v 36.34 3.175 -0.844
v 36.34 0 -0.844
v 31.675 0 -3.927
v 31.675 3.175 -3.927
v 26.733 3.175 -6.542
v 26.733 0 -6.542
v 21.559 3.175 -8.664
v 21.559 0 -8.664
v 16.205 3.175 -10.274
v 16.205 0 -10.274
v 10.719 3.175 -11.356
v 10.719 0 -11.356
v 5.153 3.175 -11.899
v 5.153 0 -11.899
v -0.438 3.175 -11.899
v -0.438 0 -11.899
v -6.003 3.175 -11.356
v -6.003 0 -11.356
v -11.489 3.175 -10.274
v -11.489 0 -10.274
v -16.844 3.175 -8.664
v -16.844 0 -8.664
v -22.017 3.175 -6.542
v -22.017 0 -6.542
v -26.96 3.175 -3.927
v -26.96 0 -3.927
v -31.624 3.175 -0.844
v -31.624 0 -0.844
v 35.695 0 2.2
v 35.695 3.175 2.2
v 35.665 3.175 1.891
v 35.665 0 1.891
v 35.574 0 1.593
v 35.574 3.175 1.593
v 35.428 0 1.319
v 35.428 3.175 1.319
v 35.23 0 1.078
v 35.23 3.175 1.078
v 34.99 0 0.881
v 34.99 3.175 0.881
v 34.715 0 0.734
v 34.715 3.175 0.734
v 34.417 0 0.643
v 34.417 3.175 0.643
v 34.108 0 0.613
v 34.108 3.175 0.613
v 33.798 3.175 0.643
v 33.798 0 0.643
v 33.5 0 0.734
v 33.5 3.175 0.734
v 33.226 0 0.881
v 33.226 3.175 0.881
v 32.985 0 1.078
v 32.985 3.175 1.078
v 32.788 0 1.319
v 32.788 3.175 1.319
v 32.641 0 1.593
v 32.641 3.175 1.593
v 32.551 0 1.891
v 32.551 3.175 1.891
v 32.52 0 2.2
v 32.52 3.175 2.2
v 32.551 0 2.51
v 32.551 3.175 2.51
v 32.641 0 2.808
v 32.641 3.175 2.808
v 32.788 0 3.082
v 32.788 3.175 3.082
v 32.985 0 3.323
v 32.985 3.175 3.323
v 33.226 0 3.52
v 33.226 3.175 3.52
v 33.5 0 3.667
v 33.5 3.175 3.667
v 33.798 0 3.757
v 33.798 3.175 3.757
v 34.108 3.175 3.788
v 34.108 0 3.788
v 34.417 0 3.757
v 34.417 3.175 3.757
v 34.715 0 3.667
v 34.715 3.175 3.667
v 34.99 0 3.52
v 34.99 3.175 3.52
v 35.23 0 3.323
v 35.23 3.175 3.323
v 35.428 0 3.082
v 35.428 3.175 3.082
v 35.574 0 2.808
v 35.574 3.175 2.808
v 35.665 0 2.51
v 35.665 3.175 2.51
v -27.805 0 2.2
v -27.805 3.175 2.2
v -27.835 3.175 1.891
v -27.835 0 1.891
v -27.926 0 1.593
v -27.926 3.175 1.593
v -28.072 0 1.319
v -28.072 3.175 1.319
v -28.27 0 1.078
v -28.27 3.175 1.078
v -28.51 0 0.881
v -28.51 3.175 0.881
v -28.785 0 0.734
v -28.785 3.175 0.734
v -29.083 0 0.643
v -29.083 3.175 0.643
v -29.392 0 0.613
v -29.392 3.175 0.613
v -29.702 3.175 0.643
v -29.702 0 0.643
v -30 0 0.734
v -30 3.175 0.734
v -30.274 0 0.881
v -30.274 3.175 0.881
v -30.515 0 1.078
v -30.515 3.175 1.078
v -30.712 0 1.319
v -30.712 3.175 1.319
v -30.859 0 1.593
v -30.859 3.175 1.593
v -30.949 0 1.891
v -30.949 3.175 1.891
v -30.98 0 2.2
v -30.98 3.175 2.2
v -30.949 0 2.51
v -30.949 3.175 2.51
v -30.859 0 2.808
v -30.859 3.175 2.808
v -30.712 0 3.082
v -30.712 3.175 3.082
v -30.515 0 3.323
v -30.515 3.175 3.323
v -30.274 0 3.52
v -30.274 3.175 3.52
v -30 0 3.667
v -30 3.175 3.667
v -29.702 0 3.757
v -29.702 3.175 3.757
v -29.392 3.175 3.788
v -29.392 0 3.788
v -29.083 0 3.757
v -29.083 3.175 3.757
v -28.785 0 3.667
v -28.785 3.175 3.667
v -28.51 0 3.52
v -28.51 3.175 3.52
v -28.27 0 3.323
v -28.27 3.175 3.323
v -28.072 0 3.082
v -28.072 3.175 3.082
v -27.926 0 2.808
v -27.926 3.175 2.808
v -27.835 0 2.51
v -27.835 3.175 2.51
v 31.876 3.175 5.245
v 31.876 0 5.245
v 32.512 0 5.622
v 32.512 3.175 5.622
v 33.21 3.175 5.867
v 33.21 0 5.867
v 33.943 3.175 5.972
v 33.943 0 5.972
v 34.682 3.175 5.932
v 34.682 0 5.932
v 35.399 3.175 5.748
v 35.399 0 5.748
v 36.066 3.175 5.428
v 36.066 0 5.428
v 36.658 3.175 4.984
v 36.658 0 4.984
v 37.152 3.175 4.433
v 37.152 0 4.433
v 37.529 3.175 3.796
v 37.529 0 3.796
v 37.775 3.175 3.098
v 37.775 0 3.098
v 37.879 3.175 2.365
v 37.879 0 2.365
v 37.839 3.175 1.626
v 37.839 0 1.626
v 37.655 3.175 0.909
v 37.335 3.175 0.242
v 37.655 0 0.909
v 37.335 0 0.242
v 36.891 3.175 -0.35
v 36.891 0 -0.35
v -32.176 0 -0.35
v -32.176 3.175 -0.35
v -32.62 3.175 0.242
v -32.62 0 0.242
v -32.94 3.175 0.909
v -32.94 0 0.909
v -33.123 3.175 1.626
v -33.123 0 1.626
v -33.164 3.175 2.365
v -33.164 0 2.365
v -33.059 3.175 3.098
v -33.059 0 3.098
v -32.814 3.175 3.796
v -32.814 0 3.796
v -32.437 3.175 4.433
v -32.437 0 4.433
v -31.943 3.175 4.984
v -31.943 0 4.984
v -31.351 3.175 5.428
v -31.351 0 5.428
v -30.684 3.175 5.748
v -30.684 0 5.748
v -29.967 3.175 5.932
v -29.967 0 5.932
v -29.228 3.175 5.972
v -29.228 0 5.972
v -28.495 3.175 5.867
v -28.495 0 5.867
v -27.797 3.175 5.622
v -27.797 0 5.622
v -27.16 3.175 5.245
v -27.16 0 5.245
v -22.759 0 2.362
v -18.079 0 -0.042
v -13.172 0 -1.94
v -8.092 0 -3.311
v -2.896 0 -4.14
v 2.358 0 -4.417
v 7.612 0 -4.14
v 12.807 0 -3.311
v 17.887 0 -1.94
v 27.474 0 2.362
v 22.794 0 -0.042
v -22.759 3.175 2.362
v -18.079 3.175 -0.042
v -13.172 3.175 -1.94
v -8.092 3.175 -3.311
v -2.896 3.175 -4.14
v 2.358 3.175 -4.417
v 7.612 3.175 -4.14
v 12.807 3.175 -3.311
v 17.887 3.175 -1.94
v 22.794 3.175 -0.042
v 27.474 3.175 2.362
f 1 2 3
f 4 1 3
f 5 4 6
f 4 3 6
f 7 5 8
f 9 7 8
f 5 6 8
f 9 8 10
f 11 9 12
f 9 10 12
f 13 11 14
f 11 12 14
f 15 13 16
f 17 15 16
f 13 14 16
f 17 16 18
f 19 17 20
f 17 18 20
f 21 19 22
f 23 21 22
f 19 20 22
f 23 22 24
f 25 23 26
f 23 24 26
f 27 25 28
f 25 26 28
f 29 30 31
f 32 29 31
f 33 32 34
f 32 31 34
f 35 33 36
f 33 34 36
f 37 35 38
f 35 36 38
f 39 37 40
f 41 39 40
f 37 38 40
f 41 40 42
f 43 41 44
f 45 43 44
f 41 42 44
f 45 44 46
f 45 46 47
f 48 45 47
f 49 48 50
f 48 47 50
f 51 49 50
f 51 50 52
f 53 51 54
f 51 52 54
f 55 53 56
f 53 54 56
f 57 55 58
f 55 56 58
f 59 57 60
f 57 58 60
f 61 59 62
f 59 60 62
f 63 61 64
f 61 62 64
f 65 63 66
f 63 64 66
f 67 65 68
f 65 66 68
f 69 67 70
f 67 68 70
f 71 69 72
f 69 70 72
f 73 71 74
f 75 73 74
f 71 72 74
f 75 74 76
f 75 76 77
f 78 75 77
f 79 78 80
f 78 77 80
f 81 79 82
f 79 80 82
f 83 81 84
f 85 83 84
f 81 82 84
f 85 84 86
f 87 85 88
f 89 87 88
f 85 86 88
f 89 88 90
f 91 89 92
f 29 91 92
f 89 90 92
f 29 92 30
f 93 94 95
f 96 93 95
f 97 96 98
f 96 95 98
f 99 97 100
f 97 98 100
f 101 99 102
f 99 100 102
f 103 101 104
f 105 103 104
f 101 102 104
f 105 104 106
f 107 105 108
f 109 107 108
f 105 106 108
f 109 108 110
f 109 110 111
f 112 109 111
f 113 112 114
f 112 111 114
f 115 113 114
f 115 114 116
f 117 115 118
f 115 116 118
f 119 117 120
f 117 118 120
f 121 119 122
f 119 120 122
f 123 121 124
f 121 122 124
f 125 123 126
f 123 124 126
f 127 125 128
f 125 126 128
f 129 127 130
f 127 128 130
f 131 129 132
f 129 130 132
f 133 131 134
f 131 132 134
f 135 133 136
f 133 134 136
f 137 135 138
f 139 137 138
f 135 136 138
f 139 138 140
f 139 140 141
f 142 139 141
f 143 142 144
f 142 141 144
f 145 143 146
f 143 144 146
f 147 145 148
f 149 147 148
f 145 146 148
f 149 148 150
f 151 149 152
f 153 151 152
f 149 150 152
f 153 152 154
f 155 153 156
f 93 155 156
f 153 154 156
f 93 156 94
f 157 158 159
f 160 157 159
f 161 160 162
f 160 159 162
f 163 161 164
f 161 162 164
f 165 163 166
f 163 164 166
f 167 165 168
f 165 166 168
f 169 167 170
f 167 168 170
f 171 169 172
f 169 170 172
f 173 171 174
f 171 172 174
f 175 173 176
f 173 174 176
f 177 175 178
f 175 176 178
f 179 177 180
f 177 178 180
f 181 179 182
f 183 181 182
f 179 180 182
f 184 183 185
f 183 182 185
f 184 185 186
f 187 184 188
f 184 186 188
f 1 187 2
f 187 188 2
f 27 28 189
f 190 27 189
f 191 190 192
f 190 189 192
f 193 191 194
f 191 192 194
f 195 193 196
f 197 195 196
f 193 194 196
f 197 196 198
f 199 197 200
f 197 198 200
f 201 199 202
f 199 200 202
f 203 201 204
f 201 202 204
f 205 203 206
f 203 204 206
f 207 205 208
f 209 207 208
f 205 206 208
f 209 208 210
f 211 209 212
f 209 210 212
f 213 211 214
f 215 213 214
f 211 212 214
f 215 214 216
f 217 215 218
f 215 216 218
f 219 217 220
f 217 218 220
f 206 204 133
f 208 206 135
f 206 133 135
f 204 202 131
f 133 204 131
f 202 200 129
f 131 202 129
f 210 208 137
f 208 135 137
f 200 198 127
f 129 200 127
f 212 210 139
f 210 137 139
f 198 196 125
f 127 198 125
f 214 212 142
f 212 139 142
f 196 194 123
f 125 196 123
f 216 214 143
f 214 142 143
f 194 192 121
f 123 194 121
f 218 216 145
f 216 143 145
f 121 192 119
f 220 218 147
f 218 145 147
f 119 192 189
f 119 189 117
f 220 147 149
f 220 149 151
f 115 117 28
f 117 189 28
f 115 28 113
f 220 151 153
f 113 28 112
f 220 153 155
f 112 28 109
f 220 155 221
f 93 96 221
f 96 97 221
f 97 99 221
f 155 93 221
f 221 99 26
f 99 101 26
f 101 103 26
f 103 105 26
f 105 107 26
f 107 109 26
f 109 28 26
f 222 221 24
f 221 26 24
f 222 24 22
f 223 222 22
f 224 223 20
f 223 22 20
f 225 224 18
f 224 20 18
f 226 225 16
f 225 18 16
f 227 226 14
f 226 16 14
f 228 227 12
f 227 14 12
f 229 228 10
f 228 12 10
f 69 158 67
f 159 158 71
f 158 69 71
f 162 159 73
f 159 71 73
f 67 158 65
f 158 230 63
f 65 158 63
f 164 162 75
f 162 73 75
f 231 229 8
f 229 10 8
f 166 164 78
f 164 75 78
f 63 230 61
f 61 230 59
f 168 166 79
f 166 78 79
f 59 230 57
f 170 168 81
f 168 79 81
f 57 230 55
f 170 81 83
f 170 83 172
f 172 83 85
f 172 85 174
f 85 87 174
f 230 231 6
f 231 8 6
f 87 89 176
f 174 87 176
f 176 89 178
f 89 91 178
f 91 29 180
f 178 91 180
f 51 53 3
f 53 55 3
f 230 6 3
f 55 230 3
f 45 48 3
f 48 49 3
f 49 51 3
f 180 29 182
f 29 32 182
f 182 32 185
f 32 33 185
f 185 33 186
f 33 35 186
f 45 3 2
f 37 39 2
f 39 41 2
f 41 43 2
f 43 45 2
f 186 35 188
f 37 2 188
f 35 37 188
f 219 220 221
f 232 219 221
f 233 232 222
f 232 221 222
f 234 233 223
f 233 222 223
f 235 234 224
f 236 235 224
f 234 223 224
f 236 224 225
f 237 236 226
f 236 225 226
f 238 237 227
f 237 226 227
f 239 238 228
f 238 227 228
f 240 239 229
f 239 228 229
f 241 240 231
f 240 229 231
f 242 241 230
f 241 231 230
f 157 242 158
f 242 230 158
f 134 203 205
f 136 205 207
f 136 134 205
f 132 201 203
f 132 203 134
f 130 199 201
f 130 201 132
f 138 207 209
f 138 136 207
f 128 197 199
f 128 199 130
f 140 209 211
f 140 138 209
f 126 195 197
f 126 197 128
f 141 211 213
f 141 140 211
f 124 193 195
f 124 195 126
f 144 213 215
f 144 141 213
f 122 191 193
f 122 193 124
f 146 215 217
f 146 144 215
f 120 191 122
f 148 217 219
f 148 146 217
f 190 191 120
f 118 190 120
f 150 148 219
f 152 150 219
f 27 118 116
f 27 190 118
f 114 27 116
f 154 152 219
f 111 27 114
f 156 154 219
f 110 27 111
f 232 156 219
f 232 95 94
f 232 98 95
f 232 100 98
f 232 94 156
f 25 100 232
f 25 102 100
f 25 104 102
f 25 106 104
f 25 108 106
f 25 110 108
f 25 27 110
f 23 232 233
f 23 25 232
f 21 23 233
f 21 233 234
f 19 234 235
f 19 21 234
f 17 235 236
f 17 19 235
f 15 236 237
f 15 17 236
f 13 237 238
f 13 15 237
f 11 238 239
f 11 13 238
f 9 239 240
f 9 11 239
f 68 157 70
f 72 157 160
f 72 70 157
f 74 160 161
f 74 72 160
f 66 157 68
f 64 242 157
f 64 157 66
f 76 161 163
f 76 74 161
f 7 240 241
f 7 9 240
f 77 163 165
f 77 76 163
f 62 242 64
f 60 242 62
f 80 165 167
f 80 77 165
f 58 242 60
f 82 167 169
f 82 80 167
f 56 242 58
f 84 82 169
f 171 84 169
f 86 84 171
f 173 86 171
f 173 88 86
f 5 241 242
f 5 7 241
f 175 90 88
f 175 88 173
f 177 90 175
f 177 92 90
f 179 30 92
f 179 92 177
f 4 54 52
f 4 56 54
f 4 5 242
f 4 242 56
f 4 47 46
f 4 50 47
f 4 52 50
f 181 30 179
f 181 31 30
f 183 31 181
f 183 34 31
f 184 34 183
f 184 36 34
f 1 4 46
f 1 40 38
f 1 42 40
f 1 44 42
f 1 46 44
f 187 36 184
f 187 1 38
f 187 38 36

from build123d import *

# Parameters (mm, degrees)
BOSS_EXTRUDE1_DEPTH = 3.175
SKETCH3_R           = 1.5875
CUT_EXTRUDE1_DEPTH  = 3.175


with BuildPart() as part:
    # Sketch2 → Boss-Extrude1 (new body)
    with BuildSketch(Plane(origin=(0, 0, 0), x_dir=(1, 0, 0), z_dir=(0, 1, 0))):
        with BuildLine():
            ThreePointArc((36.339836195, 0.843949489), (2.357673267, 11.966979488), (-31.62448966, 0.843949489))
            ThreePointArc((-31.62448966, 0.843949489), (-32.436771272, -4.432657977), (-27.160163805, -5.244939588))
            ThreePointArc((-27.160163805, -5.244939588), (2.357673267, 4.416828792), (31.87551034, -5.244939588))
            ThreePointArc((31.87551034, -5.244939588), (37.152117806, -4.432657977), (36.339836195, 0.843949489))
        make_face()
    extrude(amount=BOSS_EXTRUDE1_DEPTH)

    # Sketch3 → Cut-Extrude1 (cut)
    with BuildSketch(Plane(origin=(0, 3.175, 0), x_dir=(1, 0, 0), z_dir=(0, 1, 0))):
        with Locations((-29.392326733, -2.20049505)):
            Circle(SKETCH3_R)
        with Locations((34.107673267, -2.20049505)):
            Circle(SKETCH3_R)
    extrude(amount=-CUT_EXTRUDE1_DEPTH, mode=Mode.SUBTRACT)


solid = part.part
